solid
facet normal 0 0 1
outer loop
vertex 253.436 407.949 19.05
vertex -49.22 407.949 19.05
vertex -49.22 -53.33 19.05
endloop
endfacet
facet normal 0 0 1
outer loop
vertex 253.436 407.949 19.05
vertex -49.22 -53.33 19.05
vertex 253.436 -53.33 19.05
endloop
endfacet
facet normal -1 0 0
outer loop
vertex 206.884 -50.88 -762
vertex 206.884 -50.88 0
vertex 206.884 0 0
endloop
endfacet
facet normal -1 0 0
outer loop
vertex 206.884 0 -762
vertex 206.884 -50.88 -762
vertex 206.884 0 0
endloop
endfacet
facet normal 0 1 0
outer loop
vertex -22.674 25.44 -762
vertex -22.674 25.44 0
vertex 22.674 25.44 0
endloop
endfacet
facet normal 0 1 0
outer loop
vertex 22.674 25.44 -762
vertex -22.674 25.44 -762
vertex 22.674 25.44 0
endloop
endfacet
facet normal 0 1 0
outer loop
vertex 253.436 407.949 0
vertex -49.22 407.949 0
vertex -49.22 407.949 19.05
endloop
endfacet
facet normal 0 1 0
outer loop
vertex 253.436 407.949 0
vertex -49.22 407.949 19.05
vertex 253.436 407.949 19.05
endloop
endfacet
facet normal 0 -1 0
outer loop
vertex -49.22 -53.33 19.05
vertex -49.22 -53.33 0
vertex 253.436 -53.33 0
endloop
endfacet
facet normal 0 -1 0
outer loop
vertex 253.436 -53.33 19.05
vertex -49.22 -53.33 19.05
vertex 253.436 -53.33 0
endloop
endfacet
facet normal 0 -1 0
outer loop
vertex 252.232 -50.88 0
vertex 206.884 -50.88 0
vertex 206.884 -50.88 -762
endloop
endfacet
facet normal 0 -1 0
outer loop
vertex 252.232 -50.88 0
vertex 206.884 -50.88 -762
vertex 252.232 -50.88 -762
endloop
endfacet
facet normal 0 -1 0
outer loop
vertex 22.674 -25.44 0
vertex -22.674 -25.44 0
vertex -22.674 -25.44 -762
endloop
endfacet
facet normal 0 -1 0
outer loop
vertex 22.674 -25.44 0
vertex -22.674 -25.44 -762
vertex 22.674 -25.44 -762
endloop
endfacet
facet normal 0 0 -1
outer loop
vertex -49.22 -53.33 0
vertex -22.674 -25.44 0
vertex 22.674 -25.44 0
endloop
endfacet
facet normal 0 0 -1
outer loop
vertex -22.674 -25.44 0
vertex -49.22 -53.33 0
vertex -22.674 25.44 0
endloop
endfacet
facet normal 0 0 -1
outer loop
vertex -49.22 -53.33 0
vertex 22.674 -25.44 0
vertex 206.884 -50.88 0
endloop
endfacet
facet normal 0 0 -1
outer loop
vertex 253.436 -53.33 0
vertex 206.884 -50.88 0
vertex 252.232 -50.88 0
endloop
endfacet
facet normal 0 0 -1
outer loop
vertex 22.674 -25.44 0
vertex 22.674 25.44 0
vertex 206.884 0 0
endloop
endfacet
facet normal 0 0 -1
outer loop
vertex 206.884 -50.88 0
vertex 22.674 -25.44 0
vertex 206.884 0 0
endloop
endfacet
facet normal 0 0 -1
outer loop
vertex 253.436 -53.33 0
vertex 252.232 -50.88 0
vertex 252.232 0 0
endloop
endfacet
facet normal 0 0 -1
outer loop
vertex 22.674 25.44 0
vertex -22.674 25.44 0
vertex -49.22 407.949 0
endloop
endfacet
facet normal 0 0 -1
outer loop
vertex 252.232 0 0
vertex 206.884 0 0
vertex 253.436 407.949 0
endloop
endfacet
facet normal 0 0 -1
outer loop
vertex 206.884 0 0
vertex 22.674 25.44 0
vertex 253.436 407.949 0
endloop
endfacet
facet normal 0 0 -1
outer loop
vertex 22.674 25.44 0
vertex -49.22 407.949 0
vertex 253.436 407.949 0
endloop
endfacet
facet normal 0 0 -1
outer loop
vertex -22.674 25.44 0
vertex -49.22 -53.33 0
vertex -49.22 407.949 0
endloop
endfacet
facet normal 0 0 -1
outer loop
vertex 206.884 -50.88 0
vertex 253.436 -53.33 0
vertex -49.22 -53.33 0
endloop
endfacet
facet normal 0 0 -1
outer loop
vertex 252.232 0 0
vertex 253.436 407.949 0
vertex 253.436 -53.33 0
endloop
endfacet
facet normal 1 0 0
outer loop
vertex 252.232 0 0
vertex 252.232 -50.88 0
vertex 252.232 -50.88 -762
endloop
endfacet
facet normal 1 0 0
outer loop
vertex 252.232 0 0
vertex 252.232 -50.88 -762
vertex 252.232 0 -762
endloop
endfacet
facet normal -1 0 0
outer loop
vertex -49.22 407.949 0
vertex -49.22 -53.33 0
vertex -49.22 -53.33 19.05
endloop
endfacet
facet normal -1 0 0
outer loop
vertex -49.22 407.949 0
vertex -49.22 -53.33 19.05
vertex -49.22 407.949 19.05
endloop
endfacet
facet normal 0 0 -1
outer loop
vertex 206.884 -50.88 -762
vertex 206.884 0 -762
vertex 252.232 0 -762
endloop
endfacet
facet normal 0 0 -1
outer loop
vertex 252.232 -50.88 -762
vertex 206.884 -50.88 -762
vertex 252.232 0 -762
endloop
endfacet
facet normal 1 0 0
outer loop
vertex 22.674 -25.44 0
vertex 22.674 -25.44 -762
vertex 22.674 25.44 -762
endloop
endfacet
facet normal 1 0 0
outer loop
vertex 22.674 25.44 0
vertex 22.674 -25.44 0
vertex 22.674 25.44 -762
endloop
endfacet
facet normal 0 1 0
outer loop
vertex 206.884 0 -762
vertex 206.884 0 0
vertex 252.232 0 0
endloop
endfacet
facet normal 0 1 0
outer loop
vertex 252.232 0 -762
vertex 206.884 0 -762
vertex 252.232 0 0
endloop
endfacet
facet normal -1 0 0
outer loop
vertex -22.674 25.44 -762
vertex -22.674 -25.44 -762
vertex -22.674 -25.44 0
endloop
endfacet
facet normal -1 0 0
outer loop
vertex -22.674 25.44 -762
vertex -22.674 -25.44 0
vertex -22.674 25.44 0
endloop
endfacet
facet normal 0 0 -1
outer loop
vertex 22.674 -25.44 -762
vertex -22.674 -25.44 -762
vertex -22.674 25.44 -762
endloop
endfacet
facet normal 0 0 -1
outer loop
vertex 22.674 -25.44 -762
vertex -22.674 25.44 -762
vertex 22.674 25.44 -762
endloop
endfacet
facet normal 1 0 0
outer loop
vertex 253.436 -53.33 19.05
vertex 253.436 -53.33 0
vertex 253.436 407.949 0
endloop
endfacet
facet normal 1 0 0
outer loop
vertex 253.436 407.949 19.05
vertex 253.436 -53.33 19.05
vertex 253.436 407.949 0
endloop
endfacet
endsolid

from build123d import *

# Parameters (mm, degrees)
F0_W     = 302.65603
F0_H     = 461.279019
F1_DEPTH = 19.05
F2_W     = 45.347571
F2_H     = 50.879955
F2_W_2   = 45.347572
F2_H_2   = 50.879956
F3_DEPTH = 762


with BuildPart() as f1:
    # F0 (on Top) → F1 (new body)
    with BuildSketch(Plane.XY):
        with Locations((102.108258, 177.309223)):
            Rectangle(F0_W, F0_H)
    extrude(amount=F1_DEPTH)

    # F2 (on Top) → F3 (join)
    with BuildSketch(Plane.XY):
        with Locations((229.558259, -25.439977)):
            Rectangle(F2_W, F2_H)
        Rectangle(F2_W_2, F2_H_2)
    extrude(amount=-F3_DEPTH)


solid = f1.part
